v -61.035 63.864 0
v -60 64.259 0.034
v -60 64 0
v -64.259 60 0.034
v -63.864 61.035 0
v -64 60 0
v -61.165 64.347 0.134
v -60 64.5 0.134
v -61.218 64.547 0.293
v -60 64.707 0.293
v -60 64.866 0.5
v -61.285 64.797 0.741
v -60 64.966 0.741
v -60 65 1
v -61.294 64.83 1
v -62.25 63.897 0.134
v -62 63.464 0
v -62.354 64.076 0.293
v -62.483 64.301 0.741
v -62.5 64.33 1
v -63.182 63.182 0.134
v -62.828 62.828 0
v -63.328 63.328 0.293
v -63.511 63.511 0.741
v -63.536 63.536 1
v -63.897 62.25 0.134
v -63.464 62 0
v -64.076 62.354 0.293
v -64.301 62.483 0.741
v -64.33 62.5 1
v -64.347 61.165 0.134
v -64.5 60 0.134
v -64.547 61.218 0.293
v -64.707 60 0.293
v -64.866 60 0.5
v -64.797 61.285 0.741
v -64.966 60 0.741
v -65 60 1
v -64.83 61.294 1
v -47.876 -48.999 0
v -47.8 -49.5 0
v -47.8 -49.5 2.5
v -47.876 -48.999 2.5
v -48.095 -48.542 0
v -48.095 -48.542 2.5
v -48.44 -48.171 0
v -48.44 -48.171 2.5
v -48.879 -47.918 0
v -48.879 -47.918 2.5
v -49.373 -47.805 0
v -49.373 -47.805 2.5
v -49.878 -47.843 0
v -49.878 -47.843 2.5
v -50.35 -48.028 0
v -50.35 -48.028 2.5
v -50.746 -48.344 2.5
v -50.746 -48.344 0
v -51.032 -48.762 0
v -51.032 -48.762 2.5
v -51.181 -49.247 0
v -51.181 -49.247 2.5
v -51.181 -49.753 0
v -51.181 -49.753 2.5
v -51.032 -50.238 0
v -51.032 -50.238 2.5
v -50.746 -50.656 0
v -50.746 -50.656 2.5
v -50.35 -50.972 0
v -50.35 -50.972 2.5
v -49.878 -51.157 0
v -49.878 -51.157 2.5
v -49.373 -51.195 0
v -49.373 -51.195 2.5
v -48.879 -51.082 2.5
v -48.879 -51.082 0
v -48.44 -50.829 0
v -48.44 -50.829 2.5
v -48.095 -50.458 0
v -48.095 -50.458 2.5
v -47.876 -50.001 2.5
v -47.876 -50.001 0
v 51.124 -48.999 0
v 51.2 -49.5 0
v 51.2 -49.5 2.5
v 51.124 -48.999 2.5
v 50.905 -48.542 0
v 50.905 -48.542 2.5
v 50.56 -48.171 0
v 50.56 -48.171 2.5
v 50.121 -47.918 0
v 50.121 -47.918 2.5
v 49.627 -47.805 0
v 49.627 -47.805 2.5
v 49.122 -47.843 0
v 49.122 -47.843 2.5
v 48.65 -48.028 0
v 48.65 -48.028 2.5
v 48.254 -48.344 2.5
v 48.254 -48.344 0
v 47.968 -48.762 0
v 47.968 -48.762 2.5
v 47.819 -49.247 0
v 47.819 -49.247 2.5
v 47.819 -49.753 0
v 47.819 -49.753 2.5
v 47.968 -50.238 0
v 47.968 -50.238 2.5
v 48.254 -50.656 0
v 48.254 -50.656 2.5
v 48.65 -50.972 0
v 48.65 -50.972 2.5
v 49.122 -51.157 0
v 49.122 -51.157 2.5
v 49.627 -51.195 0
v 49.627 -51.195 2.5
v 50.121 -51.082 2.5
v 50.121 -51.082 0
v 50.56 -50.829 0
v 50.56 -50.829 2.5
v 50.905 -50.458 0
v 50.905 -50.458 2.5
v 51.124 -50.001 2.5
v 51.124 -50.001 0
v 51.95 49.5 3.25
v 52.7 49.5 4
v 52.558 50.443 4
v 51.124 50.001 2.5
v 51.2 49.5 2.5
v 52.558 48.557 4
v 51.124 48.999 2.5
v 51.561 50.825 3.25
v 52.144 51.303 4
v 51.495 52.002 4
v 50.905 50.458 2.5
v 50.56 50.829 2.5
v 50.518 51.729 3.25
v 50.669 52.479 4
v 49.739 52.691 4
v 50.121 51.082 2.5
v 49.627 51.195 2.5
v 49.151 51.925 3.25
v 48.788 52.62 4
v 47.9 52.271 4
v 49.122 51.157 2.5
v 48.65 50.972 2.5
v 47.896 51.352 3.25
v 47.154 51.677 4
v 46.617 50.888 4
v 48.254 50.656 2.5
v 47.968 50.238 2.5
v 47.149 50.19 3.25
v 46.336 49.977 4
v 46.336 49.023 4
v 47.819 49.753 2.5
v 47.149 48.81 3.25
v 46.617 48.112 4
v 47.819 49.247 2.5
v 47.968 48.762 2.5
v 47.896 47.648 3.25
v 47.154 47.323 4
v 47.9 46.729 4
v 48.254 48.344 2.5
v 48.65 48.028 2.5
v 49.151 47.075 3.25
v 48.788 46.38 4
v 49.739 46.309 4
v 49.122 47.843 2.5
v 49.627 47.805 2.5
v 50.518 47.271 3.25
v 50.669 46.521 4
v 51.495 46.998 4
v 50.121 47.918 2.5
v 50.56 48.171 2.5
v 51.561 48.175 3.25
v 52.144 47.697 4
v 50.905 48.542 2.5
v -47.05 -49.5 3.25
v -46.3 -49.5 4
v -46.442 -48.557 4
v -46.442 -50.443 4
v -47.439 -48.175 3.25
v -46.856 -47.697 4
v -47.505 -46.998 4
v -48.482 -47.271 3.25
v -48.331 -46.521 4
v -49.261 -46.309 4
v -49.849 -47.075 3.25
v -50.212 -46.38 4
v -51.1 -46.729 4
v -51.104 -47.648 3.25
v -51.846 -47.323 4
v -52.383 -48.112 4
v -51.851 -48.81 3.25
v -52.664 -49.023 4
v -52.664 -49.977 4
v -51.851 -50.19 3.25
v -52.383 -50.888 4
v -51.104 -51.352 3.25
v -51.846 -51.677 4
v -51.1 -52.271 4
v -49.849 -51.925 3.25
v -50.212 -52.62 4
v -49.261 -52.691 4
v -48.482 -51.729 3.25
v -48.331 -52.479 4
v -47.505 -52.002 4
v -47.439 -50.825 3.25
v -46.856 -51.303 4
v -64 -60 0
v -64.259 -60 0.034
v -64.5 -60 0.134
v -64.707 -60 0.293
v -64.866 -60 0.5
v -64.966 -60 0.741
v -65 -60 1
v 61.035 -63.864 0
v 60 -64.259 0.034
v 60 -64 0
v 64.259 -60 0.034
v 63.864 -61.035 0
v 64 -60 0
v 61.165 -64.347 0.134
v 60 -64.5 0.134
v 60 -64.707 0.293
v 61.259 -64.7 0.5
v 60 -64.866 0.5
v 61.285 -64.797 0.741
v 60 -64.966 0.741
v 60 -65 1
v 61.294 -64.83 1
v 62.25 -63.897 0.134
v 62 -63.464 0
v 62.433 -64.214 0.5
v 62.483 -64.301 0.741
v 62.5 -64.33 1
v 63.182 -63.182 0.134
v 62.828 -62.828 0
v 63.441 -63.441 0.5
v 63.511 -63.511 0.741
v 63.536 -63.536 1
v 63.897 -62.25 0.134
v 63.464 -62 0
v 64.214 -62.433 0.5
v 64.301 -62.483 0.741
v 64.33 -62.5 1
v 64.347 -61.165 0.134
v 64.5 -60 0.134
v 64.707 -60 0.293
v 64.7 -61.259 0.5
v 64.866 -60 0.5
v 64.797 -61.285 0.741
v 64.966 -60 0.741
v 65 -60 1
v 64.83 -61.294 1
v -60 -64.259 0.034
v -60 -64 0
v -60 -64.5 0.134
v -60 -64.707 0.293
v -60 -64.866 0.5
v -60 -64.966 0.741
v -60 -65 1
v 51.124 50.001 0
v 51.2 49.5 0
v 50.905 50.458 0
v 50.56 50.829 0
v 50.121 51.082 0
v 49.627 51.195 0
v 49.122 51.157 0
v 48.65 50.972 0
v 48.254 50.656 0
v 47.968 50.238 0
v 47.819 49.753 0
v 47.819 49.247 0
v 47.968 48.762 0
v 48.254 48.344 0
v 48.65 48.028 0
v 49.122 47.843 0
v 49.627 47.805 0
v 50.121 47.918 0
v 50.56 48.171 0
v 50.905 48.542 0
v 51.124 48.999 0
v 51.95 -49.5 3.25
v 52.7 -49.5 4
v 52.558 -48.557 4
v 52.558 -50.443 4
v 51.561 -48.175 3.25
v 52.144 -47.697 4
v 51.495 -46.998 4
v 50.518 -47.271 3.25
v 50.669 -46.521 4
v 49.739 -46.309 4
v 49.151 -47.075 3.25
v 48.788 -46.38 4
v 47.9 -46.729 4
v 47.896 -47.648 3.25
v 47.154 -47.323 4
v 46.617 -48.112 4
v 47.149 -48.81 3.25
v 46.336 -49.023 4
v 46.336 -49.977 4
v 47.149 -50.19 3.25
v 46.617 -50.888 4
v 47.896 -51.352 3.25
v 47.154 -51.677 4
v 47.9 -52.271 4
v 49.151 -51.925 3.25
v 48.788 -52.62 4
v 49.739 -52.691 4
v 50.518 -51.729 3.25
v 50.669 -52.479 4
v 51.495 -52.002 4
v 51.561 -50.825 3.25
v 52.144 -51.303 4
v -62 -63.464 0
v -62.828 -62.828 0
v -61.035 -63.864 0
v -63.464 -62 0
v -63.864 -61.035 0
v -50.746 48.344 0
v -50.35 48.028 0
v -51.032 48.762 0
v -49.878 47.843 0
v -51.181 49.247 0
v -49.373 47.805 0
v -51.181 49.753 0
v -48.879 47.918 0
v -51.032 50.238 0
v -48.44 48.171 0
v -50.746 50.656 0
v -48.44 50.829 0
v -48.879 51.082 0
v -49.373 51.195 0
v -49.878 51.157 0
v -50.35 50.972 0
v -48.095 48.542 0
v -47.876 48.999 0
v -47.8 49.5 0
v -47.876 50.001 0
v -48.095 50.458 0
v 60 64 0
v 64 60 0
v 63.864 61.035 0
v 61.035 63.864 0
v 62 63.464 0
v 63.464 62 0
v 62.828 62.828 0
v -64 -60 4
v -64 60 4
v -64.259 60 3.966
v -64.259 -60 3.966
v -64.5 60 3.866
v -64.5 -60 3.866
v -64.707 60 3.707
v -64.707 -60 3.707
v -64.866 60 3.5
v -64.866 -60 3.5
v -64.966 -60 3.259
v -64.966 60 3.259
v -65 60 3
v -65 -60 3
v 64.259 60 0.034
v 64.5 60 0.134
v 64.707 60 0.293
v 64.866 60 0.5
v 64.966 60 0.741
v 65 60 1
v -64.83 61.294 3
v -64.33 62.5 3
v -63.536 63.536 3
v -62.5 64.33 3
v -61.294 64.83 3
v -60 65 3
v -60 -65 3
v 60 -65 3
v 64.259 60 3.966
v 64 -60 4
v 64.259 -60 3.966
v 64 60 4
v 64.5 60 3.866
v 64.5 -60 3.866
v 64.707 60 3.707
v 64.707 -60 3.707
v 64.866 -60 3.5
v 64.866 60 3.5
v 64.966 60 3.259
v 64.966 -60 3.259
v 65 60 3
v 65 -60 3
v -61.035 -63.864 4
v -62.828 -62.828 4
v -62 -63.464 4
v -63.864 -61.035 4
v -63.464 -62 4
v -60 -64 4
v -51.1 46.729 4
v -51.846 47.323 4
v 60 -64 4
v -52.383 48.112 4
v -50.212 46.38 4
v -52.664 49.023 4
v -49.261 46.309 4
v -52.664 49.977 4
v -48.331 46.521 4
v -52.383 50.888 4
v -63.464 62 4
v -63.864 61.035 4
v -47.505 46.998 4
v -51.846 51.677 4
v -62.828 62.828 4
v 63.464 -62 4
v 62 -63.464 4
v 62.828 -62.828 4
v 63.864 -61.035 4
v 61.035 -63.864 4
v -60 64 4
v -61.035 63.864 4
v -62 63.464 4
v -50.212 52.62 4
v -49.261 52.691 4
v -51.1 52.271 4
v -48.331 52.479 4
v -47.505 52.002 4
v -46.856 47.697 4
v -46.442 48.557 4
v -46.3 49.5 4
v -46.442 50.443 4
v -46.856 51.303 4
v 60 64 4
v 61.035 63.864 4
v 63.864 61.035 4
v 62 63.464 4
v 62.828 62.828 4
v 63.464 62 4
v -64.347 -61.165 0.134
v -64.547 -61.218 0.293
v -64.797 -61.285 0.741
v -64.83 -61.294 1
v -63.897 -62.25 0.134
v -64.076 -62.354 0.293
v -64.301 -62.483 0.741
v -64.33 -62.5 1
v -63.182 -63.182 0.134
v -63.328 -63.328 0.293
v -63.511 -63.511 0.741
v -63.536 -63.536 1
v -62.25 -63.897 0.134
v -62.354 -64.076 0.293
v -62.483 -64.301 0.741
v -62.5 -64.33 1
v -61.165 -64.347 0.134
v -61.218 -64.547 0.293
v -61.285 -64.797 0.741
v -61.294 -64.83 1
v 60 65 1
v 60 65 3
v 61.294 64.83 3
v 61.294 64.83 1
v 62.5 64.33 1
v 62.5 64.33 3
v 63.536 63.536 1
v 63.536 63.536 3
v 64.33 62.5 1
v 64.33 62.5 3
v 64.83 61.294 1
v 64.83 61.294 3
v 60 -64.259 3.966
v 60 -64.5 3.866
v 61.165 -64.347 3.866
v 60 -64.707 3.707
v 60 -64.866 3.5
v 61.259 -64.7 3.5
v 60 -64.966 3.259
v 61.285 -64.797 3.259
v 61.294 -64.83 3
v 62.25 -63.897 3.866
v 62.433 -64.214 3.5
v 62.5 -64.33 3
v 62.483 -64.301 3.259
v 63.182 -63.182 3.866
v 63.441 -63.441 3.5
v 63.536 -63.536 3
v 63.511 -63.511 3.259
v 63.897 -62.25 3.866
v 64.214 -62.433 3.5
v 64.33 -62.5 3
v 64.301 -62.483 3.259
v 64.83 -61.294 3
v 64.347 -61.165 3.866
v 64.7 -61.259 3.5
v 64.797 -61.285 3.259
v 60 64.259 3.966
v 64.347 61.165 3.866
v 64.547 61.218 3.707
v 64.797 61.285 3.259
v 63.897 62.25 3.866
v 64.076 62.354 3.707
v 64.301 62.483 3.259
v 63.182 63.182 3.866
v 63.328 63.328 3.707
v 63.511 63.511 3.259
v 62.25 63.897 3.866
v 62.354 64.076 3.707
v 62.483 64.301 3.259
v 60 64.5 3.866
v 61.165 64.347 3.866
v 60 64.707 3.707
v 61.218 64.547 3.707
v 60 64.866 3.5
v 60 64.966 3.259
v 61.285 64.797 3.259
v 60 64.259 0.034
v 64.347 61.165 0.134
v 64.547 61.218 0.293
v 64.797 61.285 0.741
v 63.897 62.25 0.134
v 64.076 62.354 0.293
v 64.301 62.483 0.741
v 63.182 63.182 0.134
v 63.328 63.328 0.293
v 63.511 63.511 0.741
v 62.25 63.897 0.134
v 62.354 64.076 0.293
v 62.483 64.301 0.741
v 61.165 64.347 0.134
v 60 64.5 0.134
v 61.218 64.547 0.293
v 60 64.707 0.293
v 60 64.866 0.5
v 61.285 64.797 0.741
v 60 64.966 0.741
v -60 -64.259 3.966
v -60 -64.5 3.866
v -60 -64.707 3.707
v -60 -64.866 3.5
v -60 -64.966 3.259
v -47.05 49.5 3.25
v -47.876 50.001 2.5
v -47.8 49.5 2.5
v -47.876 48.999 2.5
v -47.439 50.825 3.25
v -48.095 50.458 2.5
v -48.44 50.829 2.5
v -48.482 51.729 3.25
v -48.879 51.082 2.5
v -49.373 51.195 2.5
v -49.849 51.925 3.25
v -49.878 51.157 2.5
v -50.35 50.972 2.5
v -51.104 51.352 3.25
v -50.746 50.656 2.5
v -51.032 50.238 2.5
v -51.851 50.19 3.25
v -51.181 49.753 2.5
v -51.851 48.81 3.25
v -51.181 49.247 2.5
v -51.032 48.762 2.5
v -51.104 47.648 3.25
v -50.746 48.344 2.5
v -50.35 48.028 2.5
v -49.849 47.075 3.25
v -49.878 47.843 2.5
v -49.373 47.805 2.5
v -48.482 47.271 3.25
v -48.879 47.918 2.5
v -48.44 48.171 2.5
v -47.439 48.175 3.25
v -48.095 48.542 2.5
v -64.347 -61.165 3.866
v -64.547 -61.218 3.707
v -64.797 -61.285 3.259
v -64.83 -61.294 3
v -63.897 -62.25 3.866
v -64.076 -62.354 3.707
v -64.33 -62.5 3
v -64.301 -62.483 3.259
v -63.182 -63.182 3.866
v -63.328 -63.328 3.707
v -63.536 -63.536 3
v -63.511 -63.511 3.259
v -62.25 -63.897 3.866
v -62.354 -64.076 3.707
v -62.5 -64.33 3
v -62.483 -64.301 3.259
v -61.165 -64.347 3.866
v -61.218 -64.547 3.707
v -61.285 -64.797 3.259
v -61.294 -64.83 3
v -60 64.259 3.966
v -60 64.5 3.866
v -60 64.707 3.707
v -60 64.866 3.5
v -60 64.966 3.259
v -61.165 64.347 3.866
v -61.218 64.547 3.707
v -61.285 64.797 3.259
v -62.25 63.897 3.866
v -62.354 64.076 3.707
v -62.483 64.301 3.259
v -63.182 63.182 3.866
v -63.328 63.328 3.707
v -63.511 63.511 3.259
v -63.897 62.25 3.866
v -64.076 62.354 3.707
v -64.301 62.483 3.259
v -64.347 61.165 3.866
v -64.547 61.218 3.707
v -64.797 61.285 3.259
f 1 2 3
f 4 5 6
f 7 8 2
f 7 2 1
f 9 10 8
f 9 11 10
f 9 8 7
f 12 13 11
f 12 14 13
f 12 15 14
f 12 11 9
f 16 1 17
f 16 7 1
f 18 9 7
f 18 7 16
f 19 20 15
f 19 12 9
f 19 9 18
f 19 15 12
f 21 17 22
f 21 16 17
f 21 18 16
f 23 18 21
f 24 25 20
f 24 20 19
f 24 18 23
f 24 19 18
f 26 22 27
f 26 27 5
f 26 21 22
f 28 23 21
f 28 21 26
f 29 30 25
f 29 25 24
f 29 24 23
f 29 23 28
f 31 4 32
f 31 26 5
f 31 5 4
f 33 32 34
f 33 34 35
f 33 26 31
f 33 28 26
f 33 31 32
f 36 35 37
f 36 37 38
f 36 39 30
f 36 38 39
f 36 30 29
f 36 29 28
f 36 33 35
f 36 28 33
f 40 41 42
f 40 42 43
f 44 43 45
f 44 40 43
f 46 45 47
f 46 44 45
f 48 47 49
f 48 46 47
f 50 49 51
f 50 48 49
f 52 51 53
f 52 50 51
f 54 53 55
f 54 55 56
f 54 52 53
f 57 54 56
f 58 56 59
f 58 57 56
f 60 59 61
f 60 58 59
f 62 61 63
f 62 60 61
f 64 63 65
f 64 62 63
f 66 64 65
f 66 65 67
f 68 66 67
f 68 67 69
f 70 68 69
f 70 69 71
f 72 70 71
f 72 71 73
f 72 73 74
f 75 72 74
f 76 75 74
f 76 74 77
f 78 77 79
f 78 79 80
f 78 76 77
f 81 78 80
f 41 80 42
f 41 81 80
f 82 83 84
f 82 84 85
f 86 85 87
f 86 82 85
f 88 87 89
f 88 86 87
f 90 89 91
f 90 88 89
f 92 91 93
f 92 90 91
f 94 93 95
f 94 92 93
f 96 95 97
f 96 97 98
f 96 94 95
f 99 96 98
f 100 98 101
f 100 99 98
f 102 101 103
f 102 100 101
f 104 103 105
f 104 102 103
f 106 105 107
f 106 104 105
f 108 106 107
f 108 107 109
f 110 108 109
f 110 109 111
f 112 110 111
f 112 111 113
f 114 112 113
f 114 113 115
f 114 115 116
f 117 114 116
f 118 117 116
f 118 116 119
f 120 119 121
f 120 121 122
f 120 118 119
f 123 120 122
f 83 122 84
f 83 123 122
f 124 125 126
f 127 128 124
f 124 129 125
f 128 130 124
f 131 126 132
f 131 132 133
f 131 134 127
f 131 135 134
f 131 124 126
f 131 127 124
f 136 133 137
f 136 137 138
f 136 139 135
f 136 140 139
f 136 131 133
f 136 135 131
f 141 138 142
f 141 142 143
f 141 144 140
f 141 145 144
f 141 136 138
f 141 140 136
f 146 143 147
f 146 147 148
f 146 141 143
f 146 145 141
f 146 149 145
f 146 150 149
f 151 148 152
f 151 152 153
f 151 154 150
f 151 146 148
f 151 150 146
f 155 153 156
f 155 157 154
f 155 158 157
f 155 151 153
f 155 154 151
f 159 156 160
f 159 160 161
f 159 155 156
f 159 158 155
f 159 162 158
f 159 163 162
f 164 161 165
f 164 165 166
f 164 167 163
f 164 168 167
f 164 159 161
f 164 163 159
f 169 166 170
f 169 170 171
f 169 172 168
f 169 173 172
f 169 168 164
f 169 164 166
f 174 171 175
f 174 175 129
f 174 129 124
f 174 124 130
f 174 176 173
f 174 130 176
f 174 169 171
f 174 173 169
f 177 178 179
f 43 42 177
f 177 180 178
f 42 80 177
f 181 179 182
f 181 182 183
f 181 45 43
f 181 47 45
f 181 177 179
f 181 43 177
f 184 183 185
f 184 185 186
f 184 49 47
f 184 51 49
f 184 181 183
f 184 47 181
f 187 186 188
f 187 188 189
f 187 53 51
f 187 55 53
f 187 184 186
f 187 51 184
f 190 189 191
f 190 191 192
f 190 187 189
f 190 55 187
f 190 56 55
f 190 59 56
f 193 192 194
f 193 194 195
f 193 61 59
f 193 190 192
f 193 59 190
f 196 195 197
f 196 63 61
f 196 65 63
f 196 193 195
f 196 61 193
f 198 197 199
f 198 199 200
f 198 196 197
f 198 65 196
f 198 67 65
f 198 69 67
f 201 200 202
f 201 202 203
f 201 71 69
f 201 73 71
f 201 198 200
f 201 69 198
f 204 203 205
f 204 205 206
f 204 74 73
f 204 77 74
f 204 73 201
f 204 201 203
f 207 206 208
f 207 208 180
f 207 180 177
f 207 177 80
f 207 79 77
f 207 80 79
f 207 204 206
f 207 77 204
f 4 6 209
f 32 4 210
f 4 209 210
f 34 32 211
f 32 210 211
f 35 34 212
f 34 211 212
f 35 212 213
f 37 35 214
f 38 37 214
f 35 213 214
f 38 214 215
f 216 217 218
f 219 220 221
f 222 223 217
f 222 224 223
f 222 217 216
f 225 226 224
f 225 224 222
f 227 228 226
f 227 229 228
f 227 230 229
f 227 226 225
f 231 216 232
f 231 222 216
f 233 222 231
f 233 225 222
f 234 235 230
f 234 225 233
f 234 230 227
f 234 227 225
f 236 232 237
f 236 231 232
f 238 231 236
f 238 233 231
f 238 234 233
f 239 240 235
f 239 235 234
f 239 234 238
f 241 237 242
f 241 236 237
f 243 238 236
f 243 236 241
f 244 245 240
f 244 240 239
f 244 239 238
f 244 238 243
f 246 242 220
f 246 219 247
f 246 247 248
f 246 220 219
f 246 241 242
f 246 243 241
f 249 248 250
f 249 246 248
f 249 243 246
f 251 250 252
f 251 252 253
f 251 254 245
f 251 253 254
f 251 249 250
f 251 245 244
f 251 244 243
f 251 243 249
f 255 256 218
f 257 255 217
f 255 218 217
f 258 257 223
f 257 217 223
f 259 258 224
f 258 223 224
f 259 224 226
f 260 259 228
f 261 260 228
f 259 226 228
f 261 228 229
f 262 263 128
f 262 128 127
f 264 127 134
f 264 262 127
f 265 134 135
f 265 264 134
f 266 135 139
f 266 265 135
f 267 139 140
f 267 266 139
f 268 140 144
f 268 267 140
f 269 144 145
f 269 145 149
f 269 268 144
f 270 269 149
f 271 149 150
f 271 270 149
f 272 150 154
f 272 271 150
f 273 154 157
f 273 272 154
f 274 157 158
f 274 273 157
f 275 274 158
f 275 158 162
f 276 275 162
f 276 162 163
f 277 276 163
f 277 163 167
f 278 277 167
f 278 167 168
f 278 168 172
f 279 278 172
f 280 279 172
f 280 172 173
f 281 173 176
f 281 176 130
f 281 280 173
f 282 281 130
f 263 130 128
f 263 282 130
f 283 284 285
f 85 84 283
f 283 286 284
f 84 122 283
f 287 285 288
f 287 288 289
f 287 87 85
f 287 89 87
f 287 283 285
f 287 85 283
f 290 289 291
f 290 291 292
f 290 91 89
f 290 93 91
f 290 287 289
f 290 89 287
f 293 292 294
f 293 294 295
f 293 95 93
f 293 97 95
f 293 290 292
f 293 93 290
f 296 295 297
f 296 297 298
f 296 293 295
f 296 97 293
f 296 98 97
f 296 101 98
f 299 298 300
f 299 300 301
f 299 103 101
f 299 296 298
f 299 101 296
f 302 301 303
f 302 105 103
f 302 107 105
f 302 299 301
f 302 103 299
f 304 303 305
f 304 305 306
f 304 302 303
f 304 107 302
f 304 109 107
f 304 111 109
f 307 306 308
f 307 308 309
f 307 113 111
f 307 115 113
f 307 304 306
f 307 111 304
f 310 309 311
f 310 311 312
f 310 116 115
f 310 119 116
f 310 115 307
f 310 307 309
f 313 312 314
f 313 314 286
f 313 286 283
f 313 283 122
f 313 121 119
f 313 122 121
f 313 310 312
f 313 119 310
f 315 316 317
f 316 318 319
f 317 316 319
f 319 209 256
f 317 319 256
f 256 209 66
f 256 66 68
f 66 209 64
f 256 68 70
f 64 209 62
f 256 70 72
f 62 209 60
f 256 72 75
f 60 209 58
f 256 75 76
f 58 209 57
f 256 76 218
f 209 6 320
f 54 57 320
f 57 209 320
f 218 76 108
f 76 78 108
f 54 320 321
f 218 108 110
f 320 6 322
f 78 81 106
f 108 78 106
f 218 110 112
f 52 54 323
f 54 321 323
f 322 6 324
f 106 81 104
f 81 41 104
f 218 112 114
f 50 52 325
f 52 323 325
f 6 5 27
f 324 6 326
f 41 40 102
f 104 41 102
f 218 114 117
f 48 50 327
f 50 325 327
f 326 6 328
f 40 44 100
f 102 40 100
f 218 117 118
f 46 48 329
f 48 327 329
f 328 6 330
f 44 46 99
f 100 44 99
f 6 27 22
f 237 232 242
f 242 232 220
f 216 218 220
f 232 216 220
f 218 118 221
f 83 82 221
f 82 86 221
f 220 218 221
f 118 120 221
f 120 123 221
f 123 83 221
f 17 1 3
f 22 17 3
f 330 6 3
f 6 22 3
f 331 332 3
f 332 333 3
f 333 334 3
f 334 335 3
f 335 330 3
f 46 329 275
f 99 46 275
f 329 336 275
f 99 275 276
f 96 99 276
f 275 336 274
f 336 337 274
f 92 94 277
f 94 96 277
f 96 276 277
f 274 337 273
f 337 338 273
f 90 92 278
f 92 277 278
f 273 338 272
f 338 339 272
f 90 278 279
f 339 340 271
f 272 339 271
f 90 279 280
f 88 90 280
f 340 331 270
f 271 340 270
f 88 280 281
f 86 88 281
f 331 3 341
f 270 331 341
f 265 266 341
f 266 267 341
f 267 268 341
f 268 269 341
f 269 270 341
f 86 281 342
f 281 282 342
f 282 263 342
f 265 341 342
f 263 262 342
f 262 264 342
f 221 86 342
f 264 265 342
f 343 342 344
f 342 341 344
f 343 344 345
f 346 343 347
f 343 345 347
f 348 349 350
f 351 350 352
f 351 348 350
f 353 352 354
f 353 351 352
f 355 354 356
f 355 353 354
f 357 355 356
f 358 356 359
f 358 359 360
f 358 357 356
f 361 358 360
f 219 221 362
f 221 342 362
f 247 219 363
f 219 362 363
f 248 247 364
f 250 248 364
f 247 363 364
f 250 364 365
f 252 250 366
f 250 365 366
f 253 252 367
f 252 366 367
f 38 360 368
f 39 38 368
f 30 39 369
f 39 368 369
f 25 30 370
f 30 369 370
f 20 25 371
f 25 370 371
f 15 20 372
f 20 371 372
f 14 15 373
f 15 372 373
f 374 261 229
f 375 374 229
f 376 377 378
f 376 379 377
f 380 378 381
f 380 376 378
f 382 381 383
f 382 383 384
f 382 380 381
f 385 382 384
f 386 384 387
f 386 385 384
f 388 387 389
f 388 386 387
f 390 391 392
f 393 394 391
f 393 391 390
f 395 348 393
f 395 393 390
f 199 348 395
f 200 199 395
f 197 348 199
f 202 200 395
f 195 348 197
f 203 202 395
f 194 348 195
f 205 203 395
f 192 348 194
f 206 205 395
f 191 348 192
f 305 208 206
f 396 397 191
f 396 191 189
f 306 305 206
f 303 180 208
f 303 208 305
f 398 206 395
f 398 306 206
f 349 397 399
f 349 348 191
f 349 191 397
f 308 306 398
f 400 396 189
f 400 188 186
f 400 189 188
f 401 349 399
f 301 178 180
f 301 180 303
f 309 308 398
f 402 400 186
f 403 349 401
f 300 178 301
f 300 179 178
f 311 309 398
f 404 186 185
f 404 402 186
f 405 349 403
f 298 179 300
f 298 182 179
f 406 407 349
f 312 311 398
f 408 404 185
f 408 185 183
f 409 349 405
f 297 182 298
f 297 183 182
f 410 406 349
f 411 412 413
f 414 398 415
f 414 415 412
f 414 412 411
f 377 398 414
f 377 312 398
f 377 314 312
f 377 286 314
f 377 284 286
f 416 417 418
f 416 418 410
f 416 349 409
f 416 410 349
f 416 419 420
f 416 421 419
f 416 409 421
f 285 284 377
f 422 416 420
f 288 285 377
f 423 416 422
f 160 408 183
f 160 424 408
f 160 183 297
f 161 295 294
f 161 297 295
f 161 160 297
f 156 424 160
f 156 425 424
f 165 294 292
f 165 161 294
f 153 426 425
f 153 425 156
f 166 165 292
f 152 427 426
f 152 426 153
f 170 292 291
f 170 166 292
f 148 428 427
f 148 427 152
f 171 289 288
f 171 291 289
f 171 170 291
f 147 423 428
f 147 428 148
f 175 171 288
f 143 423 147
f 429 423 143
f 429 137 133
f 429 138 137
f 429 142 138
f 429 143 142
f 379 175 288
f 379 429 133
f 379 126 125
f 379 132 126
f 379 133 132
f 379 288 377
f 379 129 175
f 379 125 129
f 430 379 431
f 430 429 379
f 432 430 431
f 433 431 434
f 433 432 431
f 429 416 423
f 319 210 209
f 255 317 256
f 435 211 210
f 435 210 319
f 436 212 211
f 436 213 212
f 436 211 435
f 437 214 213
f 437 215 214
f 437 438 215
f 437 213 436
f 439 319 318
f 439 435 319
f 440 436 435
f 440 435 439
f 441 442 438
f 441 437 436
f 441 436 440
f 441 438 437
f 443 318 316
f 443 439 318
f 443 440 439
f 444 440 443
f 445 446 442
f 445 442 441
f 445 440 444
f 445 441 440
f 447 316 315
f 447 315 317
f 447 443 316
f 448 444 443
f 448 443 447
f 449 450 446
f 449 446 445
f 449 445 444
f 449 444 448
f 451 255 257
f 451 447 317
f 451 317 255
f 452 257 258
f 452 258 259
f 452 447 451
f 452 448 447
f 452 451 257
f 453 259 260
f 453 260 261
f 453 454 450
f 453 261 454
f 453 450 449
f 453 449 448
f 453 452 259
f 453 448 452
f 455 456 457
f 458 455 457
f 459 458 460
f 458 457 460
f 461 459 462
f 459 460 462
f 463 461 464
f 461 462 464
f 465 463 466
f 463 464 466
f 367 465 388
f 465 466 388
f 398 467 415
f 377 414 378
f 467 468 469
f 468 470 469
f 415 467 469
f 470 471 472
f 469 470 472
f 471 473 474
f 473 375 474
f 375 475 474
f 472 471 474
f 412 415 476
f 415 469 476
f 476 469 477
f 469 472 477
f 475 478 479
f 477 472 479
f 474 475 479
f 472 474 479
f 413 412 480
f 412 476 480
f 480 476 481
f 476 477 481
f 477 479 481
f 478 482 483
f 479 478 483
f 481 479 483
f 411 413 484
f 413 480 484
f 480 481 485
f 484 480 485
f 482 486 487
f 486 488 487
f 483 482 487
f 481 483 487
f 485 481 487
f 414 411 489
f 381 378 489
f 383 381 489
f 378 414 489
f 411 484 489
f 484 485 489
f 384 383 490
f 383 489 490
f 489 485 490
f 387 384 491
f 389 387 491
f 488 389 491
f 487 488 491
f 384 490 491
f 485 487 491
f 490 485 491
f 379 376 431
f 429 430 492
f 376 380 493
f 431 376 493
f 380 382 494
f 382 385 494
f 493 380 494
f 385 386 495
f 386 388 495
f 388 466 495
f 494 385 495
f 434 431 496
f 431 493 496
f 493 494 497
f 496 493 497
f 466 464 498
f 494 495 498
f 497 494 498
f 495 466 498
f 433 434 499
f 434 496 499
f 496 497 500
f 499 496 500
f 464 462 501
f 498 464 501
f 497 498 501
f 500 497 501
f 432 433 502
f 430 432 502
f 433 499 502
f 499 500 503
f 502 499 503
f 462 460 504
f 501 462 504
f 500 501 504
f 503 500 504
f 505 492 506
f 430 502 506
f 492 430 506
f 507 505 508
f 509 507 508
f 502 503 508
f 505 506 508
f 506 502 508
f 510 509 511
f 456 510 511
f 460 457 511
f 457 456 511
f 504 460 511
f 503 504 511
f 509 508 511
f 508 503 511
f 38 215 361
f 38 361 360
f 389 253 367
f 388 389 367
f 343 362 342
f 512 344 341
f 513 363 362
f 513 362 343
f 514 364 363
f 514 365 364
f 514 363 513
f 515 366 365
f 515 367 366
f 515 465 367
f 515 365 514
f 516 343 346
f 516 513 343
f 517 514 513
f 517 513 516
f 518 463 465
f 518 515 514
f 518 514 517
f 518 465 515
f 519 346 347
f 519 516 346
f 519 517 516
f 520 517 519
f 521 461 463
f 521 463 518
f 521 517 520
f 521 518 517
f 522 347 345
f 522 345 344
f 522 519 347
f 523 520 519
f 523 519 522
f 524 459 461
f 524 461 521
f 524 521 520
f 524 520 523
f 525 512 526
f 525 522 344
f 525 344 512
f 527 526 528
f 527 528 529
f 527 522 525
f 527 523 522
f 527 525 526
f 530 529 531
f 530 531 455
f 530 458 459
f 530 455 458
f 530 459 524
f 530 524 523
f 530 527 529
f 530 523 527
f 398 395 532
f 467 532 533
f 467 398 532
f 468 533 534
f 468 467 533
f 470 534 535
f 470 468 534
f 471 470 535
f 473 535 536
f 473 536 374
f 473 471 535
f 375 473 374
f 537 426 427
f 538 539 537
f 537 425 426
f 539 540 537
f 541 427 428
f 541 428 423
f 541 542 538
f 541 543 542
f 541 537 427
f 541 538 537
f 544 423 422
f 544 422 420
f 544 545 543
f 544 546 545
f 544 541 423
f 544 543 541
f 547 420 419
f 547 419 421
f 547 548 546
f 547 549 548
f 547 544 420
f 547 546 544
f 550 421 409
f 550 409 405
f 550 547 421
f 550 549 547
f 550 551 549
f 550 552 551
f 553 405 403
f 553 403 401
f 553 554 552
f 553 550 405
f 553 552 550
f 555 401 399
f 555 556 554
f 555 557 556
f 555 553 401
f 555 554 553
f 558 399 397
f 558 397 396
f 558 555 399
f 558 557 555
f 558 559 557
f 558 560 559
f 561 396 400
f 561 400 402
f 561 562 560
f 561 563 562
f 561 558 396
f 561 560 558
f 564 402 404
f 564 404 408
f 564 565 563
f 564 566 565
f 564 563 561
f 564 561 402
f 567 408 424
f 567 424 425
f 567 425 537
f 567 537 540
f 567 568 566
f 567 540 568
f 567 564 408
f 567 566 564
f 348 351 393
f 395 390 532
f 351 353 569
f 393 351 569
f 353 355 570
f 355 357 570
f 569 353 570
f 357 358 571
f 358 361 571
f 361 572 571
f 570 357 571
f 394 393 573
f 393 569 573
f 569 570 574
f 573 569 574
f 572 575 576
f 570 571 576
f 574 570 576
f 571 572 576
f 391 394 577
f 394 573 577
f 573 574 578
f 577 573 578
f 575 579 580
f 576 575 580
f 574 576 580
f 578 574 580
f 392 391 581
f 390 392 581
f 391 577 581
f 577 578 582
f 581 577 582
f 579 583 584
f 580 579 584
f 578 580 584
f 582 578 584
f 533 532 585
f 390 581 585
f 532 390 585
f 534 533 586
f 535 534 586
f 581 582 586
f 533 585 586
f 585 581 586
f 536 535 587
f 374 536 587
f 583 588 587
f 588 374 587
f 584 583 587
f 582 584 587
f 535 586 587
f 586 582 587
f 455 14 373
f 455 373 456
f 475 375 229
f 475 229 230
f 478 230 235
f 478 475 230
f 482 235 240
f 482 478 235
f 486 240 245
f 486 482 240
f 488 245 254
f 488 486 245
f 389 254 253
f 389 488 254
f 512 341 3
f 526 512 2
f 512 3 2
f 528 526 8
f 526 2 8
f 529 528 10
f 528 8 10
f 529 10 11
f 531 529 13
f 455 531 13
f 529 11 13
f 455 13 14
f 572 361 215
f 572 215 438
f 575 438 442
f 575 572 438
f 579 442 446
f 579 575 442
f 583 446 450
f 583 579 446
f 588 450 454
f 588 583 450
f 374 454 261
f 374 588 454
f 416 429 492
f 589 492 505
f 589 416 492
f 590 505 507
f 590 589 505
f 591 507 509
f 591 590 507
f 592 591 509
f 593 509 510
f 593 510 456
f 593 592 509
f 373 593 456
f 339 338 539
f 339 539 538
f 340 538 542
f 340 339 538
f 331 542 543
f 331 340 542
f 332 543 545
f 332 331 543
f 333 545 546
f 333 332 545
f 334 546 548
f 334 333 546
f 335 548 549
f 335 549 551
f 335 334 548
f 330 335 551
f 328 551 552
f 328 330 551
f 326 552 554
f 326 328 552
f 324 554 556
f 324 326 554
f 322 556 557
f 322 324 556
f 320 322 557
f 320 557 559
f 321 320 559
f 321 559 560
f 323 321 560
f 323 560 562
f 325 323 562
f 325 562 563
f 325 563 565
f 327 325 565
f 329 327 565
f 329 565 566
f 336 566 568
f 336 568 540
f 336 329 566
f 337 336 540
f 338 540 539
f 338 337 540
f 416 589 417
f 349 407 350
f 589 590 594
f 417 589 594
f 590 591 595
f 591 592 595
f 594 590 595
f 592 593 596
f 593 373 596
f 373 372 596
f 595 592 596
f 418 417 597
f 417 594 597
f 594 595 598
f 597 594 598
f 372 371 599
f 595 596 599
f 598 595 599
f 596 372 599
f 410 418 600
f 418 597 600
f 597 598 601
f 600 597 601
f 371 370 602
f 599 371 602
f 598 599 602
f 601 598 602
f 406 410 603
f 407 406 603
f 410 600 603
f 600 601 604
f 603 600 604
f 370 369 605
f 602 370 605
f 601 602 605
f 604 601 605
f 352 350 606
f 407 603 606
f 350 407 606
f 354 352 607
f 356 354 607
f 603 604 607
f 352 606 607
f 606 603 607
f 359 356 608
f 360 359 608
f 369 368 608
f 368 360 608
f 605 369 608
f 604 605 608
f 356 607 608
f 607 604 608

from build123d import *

# Parameters (mm, degrees)
F0_W     = 130
F0_H     = 130
F0_R     = 1.7
F1_DEPTH = 4
F2_R     = 5
F3_R     = 1
F4_SIZE  = 1.5


with BuildPart() as f1:
    # F0 (on Top) → F1 (new body)
    with BuildSketch(Plane.XY):
        Rectangle(F0_W, F0_H)
        with Locations((-49.5, -49.5)):
            Circle(F0_R, mode=Mode.SUBTRACT)
        with Locations((49.5, -49.5)):
            Circle(F0_R, mode=Mode.SUBTRACT)
        with Locations((-49.5, 49.5)):
            Circle(F0_R, mode=Mode.SUBTRACT)
        with Locations((49.5, 49.5)):
            Circle(F0_R, mode=Mode.SUBTRACT)
    extrude(amount=F1_DEPTH)

    # F2
    f2_edges = [f1.edges().sort_by_distance(p)[0] for p in [
        (65, 65, 2),
        (65, -65, 2),
        (-65, -65, 2),
        (-65, 65, 2),
    ]]
    fillet(f2_edges, radius=F2_R)

    # F3
    f3_edges = [f1.edges().sort_by_distance(p)[0] for p in [
        (65, 0, 4),
        (65, 0, 0),
    ]]
    fillet(f3_edges, radius=F3_R)

    # F4
    f4_edges = [f1.edges().sort_by_distance(p)[0] for p in [
        (-51.2, 49.5, 4),
        (47.8, 49.5, 4),
        (47.8, -49.5, 4),
        (-51.2, -49.5, 4),
    ]]
    chamfer(f4_edges, length=F4_SIZE)


solid = f1.part
